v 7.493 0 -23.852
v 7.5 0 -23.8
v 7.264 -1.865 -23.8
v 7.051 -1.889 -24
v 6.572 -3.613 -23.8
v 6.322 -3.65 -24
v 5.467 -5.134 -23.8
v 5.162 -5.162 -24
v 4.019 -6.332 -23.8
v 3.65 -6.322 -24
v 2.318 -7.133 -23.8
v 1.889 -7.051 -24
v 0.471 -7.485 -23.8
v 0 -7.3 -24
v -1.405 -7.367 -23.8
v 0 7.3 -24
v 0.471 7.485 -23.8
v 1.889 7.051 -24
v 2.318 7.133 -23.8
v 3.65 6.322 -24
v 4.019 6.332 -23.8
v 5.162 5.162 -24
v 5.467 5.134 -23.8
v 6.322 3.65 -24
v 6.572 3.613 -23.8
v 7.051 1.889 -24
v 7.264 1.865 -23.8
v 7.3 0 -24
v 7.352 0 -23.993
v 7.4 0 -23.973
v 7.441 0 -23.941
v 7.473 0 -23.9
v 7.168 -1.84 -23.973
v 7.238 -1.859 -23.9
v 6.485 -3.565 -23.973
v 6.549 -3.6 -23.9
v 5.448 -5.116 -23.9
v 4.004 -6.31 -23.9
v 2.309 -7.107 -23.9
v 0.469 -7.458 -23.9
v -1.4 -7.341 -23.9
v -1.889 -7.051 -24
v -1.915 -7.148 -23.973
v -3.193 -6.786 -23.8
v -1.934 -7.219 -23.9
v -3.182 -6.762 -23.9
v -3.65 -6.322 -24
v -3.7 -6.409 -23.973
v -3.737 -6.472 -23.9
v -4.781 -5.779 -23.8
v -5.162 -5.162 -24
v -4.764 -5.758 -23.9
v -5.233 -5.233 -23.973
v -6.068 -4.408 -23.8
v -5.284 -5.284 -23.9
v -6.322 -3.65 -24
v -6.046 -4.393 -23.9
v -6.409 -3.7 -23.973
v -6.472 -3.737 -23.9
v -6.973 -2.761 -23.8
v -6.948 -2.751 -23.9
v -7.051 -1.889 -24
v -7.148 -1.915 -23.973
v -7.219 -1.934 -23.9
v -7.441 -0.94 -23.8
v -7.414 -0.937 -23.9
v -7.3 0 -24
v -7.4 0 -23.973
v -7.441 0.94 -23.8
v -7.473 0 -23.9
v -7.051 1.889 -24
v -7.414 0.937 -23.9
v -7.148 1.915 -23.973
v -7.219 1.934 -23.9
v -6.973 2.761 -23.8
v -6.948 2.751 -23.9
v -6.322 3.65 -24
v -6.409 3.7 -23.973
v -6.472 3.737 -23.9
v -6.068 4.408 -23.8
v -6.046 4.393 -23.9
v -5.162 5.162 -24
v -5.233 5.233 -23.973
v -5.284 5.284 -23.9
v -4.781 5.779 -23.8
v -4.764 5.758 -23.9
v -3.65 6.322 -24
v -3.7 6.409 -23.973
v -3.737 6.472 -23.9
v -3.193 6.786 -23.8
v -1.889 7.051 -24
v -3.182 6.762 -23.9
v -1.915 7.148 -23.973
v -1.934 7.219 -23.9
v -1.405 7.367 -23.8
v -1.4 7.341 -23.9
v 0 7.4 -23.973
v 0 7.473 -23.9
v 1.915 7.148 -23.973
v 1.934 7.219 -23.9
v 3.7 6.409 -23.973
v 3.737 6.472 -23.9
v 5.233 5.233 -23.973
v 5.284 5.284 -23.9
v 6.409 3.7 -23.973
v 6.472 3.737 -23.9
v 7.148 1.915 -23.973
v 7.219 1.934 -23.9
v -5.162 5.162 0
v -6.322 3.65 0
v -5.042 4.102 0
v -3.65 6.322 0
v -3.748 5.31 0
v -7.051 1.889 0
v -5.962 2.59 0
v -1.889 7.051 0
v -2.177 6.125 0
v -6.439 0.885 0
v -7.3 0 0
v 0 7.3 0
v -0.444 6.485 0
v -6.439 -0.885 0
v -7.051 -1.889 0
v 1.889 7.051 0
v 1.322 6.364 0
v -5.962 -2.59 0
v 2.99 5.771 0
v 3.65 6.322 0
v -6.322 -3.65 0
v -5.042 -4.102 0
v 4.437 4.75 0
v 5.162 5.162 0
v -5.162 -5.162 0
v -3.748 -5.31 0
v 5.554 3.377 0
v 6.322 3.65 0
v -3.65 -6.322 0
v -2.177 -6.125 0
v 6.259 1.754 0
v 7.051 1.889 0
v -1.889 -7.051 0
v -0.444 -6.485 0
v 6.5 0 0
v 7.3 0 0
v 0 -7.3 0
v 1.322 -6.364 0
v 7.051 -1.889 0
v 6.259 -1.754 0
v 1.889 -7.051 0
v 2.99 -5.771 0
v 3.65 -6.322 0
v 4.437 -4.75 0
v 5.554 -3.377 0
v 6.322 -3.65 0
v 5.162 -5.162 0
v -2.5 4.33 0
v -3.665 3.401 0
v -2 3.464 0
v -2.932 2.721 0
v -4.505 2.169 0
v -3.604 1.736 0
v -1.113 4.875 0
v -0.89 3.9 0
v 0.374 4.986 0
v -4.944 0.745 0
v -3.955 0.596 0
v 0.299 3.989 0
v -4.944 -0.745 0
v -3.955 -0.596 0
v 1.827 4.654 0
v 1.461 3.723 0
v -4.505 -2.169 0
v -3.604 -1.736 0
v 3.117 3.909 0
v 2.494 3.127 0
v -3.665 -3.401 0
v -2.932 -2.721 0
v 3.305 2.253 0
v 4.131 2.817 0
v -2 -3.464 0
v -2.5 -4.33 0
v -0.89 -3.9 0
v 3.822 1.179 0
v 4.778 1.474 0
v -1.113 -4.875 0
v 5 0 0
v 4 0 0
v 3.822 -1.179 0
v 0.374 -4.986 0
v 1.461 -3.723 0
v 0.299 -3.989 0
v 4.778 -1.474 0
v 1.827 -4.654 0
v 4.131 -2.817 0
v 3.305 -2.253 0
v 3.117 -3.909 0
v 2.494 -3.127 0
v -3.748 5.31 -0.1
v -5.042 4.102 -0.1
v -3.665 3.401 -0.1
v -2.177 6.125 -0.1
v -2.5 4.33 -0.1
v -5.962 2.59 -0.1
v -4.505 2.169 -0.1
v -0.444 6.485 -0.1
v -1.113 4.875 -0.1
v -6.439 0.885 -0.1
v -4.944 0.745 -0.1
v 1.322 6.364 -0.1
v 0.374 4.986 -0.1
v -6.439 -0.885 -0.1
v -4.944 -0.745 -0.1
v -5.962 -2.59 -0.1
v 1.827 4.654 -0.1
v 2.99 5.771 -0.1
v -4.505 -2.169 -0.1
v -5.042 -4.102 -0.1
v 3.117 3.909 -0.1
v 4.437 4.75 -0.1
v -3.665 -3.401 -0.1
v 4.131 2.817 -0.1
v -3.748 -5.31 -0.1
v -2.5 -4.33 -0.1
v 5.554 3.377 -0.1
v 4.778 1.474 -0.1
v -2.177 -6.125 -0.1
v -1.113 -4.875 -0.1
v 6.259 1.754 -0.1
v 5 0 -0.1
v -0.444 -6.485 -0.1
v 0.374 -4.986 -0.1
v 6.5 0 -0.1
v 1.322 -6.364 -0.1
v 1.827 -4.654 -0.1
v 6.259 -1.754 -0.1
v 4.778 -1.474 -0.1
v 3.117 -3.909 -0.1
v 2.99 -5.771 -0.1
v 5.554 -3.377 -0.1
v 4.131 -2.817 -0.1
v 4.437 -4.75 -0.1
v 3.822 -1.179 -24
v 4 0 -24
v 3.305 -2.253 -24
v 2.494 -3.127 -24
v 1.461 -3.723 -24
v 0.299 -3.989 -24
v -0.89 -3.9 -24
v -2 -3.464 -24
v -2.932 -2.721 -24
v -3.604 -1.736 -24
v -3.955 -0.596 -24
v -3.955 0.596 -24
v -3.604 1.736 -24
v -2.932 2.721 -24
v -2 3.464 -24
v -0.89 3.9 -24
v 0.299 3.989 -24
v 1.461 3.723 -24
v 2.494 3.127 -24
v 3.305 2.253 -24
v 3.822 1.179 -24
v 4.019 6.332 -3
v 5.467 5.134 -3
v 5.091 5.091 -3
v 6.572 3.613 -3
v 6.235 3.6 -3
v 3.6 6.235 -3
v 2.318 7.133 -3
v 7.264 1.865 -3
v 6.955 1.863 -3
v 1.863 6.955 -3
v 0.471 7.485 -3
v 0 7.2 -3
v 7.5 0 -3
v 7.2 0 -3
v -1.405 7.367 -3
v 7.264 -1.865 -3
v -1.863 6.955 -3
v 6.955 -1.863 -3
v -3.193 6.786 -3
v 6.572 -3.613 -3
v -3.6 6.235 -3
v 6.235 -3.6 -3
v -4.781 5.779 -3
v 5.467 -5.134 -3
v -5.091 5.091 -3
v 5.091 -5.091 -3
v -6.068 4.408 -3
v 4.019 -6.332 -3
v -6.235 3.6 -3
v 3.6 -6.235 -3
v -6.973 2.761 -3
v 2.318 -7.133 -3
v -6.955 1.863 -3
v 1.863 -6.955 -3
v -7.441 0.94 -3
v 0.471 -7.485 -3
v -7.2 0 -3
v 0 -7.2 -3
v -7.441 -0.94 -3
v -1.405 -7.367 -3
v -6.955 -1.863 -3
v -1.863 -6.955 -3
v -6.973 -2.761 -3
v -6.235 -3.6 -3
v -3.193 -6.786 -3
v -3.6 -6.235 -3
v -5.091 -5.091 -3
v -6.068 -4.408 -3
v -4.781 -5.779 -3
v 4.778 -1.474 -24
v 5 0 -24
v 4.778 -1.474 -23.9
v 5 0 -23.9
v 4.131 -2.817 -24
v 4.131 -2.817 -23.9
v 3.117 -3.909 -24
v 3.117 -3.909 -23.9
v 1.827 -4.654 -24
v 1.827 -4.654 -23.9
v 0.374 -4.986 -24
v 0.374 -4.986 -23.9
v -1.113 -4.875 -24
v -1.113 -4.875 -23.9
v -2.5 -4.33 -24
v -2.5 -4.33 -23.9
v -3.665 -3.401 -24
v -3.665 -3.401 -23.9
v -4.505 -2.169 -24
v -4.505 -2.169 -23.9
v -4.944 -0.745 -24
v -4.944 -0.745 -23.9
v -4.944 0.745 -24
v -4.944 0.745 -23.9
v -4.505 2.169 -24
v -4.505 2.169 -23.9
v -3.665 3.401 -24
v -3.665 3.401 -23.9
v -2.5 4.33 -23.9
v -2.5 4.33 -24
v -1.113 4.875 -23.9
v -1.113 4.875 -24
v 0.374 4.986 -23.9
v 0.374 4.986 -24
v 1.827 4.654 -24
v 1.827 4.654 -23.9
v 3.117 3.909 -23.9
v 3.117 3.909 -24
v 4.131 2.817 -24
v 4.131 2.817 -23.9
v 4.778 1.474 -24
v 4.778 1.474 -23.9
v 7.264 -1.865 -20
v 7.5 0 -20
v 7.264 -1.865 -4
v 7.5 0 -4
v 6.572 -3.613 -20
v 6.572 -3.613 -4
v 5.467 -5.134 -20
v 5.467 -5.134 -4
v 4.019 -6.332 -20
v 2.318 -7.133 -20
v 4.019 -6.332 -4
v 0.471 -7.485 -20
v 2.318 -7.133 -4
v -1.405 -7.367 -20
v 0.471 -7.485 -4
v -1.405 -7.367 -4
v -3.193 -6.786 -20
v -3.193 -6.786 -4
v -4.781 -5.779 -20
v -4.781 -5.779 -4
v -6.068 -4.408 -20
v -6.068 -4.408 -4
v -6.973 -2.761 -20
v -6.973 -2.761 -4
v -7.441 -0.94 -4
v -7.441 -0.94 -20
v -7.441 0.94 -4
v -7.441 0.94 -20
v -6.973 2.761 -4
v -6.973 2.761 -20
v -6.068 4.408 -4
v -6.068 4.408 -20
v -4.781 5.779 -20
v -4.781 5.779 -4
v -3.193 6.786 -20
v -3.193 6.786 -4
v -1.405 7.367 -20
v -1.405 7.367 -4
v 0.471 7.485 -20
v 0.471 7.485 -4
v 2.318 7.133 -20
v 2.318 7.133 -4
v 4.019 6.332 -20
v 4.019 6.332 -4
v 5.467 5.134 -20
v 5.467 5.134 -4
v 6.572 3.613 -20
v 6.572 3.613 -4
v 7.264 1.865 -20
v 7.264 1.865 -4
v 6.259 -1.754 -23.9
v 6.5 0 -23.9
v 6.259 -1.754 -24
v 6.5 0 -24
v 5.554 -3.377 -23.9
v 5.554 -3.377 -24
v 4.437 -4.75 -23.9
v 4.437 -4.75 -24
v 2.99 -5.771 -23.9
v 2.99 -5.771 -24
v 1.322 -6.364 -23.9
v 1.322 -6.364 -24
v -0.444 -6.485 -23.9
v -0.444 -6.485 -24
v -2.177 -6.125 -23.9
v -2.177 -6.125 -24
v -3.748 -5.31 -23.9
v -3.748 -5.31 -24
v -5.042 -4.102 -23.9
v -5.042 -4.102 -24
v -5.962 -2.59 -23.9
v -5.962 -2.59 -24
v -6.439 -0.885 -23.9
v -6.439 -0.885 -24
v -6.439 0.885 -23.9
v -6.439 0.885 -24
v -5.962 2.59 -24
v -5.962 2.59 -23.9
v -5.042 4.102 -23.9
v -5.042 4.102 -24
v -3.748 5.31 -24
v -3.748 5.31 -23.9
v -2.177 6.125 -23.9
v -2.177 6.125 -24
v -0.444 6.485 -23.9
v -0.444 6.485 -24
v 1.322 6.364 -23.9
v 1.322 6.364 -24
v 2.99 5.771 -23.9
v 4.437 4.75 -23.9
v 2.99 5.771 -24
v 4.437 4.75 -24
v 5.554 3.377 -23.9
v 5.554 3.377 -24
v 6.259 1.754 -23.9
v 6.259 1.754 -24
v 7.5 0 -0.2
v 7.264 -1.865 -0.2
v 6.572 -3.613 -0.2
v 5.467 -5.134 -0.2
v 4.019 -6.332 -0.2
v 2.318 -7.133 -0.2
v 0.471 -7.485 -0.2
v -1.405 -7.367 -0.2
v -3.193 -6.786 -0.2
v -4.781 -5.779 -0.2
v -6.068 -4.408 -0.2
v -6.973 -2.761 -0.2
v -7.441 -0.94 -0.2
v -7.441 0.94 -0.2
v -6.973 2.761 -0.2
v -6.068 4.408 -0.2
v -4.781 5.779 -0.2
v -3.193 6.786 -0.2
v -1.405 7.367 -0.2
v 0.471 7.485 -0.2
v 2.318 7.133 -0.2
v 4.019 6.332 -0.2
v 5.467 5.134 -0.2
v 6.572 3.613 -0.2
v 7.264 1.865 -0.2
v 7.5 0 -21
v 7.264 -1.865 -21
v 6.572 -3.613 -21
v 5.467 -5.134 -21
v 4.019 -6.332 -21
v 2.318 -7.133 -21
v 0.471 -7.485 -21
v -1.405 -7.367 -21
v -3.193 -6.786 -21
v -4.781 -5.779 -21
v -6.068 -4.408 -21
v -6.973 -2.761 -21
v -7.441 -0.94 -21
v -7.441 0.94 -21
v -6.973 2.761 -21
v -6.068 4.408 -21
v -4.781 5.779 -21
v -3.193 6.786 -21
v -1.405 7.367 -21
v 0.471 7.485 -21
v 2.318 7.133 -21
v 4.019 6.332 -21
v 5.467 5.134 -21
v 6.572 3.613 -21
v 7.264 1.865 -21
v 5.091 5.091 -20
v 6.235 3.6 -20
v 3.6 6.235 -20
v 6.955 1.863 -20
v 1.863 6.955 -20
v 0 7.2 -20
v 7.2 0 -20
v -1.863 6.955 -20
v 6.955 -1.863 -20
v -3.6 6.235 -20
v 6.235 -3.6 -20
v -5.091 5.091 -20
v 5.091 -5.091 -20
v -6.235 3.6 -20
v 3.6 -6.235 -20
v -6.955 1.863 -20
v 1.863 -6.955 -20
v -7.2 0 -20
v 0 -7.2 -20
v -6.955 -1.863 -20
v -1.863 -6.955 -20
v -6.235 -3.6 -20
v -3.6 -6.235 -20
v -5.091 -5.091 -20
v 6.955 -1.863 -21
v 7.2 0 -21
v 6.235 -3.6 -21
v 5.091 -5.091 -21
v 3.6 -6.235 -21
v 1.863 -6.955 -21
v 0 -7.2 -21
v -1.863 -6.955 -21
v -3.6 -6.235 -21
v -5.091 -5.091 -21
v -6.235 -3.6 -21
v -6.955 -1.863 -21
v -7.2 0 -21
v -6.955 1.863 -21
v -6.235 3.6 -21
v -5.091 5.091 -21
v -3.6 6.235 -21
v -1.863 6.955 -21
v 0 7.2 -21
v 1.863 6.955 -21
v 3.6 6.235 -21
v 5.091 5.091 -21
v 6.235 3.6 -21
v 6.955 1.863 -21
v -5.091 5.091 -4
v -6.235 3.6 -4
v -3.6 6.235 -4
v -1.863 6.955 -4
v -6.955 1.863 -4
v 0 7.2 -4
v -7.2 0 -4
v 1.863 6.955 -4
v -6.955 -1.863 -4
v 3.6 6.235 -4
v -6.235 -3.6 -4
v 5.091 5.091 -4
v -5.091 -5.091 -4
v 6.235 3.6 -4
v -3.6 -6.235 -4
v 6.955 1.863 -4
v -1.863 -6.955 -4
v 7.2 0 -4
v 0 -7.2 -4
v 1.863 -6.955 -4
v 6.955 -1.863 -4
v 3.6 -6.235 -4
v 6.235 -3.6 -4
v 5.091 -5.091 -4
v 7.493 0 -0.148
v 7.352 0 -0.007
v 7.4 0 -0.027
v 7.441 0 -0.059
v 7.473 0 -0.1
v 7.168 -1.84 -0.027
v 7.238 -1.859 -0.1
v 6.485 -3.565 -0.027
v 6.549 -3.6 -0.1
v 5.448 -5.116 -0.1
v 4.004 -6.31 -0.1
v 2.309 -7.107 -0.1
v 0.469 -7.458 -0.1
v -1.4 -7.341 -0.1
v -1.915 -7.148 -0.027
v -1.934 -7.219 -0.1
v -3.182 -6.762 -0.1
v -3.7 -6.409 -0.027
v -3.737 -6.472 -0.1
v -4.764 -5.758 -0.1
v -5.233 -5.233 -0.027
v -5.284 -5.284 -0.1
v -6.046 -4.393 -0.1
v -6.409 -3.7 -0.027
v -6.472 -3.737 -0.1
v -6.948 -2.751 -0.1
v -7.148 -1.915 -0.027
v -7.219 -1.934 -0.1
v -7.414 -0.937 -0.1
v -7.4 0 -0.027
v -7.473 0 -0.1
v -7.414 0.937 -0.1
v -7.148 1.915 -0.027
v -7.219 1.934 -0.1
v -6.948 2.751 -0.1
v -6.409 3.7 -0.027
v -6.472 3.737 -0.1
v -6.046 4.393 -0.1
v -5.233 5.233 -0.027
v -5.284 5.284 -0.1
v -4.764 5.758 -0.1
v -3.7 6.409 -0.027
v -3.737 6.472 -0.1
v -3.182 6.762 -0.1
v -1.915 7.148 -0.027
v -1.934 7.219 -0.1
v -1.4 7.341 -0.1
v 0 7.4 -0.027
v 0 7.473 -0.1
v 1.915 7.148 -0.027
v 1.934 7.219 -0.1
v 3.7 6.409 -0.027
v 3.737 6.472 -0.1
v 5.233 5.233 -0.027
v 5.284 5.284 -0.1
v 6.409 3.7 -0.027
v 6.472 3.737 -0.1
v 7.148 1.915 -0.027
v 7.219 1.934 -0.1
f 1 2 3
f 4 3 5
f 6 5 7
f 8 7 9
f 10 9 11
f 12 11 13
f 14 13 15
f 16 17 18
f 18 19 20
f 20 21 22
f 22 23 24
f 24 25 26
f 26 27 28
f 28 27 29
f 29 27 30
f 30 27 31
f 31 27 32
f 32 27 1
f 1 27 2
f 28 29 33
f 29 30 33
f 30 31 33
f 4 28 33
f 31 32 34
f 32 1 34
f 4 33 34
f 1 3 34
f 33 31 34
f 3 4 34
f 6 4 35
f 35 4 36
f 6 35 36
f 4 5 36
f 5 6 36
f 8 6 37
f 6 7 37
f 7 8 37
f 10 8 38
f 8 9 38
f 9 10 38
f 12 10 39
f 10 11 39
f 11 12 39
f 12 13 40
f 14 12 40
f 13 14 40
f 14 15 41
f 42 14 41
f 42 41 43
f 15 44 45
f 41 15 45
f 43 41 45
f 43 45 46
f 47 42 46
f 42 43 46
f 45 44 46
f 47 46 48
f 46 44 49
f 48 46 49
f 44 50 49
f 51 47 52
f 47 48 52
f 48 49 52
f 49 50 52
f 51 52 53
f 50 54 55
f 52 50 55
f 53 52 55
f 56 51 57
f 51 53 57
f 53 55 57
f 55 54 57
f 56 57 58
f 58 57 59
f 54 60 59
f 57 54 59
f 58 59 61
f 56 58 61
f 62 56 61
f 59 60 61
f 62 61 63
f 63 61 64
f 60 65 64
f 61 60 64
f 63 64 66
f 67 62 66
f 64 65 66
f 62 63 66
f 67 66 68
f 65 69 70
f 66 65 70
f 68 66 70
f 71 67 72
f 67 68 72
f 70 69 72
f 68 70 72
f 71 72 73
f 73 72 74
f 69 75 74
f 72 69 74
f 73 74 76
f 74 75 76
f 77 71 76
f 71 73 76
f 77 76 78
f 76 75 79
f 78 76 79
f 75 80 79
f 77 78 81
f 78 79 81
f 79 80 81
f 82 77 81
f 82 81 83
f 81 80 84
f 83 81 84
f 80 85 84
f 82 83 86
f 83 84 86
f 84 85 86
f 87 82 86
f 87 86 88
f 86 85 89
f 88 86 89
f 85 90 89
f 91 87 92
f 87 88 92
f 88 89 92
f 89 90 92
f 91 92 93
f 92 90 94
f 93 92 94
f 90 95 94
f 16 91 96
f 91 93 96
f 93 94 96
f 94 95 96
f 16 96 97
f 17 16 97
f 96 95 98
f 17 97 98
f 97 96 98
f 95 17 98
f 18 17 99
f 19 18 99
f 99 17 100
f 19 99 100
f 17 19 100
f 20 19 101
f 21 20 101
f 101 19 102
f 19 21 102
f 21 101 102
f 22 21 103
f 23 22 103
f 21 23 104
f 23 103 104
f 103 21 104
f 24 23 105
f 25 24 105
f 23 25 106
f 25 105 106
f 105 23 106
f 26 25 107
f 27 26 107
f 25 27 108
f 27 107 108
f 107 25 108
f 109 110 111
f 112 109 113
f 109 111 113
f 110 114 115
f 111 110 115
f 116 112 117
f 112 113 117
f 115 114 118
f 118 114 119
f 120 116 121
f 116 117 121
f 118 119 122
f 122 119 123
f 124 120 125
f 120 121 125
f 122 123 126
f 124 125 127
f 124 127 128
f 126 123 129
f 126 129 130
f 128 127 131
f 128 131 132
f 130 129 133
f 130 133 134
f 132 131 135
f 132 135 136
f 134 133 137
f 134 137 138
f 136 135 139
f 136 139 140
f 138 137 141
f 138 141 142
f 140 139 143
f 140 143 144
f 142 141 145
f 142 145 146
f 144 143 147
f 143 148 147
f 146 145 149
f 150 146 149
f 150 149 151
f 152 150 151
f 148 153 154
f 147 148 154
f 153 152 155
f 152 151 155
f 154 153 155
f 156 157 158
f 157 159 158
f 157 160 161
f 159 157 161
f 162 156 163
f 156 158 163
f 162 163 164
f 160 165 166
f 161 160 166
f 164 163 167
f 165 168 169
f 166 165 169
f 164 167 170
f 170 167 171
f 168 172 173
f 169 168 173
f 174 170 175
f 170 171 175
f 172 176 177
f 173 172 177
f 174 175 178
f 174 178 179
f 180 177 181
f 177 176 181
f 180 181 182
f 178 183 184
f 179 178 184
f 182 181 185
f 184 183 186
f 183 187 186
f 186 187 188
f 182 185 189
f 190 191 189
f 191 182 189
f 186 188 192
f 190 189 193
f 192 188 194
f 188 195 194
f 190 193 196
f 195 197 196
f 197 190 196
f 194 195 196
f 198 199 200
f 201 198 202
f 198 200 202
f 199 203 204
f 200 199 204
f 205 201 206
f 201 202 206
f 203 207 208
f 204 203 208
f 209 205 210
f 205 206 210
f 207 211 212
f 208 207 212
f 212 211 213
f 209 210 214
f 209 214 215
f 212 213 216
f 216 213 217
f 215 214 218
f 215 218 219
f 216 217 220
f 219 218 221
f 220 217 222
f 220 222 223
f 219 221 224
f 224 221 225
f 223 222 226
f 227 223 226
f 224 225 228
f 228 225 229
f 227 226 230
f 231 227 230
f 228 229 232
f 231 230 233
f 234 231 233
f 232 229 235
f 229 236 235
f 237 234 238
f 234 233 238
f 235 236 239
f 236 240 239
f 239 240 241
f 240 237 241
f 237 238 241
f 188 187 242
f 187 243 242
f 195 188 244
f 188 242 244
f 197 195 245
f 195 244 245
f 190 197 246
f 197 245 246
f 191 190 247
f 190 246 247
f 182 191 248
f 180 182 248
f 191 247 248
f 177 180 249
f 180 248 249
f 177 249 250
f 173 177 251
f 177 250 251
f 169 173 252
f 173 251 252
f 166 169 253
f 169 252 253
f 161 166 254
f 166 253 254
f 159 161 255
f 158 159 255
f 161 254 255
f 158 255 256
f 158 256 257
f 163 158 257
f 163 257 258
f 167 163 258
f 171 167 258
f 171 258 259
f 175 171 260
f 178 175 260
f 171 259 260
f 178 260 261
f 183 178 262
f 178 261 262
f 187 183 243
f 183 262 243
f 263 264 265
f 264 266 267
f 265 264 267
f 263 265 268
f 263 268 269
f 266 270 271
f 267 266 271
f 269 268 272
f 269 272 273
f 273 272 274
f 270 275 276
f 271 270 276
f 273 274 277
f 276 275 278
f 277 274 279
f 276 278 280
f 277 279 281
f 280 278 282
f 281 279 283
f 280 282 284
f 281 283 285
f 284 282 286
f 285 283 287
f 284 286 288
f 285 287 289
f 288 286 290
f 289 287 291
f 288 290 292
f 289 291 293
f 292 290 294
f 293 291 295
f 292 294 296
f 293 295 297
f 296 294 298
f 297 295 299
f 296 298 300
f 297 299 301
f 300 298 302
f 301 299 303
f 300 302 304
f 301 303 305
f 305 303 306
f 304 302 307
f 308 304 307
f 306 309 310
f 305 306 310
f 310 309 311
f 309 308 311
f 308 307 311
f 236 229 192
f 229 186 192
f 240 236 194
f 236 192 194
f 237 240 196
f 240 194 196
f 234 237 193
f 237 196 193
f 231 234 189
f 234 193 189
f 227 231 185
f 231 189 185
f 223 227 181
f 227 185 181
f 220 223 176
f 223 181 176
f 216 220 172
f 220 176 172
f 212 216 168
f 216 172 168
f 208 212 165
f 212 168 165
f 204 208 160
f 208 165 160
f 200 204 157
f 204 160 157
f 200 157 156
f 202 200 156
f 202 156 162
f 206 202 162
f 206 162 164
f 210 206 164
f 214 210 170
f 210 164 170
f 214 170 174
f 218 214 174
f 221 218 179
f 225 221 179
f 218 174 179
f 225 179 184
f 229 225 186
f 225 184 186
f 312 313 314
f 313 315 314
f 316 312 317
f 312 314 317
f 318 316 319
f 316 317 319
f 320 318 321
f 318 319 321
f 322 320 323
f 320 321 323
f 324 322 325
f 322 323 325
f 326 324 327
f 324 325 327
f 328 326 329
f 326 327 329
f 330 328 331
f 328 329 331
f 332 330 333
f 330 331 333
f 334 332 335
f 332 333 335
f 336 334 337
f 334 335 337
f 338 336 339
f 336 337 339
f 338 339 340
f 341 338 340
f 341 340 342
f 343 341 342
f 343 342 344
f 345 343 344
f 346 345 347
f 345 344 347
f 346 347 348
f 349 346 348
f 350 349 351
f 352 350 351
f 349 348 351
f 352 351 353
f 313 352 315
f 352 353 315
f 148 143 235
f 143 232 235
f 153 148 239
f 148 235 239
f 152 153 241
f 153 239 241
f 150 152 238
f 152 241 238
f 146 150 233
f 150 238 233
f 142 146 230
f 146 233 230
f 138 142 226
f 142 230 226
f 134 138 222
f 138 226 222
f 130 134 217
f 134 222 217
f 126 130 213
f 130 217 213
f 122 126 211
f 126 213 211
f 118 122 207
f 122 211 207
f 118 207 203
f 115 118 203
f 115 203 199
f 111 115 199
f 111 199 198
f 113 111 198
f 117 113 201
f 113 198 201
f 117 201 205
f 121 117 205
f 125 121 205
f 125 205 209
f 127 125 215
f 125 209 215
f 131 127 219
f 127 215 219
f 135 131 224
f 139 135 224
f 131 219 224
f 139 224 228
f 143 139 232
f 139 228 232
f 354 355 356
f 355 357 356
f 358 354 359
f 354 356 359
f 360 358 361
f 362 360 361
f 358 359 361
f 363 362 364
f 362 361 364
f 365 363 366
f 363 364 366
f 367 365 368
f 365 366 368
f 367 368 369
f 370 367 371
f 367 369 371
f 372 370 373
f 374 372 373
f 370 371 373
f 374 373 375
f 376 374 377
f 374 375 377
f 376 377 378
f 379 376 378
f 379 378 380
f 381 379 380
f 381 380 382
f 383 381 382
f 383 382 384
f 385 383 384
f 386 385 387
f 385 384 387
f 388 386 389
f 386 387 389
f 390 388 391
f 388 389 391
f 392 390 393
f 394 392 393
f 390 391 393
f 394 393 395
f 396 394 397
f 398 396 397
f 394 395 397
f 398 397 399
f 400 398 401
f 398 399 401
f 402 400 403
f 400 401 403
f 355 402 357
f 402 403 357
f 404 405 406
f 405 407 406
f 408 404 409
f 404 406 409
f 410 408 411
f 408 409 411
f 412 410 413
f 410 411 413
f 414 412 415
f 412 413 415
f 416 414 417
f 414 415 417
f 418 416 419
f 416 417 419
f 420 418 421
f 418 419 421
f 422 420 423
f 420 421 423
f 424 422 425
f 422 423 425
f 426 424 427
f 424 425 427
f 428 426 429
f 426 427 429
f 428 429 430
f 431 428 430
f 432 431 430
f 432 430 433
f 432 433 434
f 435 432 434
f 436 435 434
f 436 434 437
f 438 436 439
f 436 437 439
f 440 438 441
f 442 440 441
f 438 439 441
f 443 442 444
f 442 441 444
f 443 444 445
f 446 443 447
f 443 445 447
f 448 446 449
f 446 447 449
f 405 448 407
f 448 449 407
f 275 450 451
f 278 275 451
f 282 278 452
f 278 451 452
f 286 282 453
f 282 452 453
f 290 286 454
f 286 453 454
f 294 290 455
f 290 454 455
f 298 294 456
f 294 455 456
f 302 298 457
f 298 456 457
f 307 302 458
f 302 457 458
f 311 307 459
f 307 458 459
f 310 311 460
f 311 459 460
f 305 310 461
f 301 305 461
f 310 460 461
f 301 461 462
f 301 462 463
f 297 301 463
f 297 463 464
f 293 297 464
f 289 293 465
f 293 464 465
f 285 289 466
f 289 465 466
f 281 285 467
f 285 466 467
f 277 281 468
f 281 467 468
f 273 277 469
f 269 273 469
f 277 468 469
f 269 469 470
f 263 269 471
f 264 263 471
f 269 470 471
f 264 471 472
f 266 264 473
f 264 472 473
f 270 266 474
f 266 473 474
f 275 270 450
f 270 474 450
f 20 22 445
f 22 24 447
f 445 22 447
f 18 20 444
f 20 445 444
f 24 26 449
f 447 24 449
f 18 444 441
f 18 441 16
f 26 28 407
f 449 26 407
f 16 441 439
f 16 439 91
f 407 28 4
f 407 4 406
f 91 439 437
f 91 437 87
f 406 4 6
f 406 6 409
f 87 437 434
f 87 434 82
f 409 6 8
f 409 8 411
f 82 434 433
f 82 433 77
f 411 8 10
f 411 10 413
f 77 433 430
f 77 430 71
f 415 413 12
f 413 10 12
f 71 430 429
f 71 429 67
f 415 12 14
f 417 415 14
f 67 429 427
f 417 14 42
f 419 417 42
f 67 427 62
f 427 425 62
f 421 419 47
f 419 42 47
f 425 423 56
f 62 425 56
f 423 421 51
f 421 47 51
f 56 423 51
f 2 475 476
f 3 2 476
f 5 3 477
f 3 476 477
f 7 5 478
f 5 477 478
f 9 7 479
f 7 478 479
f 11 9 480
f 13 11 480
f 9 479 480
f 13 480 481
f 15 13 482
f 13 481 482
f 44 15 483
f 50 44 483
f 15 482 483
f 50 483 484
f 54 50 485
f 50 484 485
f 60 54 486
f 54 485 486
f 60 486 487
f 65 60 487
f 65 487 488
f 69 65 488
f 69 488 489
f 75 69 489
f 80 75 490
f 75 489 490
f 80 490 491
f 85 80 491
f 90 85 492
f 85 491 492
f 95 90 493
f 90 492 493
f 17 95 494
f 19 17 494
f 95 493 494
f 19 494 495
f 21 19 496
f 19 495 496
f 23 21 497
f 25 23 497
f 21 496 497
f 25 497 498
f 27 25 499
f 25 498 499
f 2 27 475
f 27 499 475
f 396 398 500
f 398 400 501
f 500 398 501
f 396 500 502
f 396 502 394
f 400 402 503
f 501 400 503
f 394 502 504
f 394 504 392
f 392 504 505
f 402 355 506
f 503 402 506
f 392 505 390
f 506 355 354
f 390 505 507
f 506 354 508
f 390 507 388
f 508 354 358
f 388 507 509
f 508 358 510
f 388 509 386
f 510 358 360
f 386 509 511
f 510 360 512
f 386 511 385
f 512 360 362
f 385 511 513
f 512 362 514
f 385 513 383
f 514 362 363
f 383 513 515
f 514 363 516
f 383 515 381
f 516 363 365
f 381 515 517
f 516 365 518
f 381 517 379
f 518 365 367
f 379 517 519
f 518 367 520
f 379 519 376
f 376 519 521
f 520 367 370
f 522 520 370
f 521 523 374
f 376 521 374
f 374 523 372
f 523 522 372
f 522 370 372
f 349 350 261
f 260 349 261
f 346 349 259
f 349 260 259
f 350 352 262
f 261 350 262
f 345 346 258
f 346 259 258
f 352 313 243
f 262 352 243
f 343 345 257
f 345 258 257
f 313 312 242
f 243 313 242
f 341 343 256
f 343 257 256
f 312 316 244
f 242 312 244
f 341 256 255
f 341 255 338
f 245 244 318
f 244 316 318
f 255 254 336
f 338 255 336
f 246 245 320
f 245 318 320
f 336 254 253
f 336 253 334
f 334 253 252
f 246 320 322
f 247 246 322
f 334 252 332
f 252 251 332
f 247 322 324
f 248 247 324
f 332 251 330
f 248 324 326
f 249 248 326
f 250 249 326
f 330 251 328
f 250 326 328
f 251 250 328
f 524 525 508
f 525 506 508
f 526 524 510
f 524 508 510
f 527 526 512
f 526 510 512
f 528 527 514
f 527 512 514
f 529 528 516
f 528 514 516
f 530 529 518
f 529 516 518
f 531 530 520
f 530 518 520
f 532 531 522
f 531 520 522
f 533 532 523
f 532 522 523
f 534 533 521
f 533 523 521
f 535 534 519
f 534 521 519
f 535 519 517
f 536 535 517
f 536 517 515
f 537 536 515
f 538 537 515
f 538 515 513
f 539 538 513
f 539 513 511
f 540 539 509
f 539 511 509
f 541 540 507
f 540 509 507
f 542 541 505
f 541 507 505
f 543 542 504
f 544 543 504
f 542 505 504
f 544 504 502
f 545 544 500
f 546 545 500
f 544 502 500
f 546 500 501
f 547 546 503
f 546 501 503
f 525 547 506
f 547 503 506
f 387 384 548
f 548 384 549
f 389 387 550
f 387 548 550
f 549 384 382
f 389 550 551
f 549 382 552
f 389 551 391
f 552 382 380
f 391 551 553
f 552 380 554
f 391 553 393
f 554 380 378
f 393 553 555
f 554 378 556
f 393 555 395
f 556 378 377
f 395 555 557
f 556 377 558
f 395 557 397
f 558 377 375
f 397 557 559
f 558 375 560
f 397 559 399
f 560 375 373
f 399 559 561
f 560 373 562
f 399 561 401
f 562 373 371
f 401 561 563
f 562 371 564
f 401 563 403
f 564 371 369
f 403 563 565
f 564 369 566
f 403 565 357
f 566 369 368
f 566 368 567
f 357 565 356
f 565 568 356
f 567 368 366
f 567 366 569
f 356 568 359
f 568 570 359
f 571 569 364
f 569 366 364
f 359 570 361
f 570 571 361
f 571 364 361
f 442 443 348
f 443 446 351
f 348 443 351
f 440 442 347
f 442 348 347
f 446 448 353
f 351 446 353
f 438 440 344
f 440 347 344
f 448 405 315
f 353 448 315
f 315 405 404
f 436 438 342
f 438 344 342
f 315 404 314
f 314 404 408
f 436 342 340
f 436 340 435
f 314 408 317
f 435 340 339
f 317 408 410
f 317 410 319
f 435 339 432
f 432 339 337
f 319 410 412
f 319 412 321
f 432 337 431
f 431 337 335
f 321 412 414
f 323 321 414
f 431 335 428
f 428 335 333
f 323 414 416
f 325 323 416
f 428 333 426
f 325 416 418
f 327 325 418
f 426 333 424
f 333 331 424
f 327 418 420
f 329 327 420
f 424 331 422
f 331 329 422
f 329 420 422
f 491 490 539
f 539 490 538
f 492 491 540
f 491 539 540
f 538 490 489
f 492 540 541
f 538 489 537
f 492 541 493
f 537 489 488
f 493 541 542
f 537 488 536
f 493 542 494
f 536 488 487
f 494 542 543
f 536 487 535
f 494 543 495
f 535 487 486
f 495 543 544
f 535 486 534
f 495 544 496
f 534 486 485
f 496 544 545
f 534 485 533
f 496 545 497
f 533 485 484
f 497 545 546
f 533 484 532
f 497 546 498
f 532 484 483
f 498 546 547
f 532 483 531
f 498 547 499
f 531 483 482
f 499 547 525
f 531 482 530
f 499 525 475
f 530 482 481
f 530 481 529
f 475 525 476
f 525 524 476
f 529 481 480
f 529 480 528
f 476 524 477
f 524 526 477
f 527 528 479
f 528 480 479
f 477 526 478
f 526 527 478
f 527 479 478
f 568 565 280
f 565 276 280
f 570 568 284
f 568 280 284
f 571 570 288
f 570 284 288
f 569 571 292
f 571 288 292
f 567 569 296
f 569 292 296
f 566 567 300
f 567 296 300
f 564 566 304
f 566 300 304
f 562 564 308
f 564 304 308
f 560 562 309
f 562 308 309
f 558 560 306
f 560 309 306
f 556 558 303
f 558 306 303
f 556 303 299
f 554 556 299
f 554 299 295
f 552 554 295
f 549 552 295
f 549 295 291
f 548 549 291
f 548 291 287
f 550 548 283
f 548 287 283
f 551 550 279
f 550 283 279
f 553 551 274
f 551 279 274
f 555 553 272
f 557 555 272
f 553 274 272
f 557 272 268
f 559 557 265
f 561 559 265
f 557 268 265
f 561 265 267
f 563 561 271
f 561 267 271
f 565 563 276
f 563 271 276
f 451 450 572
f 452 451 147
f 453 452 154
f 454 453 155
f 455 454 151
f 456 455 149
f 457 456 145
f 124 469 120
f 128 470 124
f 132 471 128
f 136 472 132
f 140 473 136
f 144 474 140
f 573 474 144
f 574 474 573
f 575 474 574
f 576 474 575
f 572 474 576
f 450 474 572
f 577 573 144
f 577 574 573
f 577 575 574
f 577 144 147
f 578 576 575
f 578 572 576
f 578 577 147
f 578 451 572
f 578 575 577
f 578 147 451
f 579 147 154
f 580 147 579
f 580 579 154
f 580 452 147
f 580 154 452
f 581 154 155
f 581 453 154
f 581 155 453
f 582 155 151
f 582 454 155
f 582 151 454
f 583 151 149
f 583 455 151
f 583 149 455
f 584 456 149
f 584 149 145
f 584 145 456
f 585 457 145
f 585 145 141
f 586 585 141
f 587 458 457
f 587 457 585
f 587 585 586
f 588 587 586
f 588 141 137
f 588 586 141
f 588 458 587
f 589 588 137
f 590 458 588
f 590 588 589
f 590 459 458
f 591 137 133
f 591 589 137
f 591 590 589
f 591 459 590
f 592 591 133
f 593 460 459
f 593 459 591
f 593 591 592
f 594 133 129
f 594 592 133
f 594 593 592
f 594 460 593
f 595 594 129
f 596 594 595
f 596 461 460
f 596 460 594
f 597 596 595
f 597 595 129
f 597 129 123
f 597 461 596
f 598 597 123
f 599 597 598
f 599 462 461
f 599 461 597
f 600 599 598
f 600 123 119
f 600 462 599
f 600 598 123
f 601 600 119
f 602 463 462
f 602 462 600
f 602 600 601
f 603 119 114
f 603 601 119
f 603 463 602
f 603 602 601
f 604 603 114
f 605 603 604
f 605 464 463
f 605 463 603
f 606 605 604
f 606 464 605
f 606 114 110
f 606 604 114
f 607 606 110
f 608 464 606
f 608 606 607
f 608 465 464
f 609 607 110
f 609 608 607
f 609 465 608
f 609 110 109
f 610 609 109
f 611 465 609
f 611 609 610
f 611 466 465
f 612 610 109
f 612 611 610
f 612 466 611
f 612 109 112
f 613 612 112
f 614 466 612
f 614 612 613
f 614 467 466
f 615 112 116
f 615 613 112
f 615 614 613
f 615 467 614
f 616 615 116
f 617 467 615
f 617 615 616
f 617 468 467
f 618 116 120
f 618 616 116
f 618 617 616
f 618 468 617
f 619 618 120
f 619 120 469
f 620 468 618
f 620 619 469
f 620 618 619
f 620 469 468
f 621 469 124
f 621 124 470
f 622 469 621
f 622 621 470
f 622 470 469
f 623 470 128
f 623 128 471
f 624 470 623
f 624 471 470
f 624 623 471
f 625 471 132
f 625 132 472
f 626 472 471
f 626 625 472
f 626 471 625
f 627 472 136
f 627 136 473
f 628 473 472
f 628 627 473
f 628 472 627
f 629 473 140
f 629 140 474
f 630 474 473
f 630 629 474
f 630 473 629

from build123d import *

# Parameters (mm, degrees)
FILLET1_R = 0.2


with BuildPart() as part:
    # Sketch1 → Revolve1 (revolve)
    with BuildSketch(Plane(origin=(0, 0, 0), x_dir=(0, 0, -1), z_dir=(1, 0, 0)), mode=Mode.PRIVATE) as revolve1_sk:
        Polygon((0, 7.5), (0, 6.5), (0.1, 6.5), (0.1, 5), (0, 5), (0, 4), (24, 4), (24, 5), (23.9, 5), (23.9, 6.5), (24, 6.5), (24, 7.5), (21, 7.5), (21, 7.2), (20, 7.2), (20, 7.5), (4, 7.5), (4, 7.2), (3, 7.2), (3, 7.5), align=None)
    revolve(revolve1_sk.sketch.rotate(Axis((0, 0, 0), (0, 0, -1)), 90), axis=Axis((0, 0, 0), (0, 0, -1)))

    # Fillet1
    fillet1_edges = [part.edges().sort_by_distance(p)[0] for p in [
        (-7.5, 0, -24),
        (-7.5, 0, 0),
    ]]
    fillet(fillet1_edges, radius=FILLET1_R)


solid = part.part
